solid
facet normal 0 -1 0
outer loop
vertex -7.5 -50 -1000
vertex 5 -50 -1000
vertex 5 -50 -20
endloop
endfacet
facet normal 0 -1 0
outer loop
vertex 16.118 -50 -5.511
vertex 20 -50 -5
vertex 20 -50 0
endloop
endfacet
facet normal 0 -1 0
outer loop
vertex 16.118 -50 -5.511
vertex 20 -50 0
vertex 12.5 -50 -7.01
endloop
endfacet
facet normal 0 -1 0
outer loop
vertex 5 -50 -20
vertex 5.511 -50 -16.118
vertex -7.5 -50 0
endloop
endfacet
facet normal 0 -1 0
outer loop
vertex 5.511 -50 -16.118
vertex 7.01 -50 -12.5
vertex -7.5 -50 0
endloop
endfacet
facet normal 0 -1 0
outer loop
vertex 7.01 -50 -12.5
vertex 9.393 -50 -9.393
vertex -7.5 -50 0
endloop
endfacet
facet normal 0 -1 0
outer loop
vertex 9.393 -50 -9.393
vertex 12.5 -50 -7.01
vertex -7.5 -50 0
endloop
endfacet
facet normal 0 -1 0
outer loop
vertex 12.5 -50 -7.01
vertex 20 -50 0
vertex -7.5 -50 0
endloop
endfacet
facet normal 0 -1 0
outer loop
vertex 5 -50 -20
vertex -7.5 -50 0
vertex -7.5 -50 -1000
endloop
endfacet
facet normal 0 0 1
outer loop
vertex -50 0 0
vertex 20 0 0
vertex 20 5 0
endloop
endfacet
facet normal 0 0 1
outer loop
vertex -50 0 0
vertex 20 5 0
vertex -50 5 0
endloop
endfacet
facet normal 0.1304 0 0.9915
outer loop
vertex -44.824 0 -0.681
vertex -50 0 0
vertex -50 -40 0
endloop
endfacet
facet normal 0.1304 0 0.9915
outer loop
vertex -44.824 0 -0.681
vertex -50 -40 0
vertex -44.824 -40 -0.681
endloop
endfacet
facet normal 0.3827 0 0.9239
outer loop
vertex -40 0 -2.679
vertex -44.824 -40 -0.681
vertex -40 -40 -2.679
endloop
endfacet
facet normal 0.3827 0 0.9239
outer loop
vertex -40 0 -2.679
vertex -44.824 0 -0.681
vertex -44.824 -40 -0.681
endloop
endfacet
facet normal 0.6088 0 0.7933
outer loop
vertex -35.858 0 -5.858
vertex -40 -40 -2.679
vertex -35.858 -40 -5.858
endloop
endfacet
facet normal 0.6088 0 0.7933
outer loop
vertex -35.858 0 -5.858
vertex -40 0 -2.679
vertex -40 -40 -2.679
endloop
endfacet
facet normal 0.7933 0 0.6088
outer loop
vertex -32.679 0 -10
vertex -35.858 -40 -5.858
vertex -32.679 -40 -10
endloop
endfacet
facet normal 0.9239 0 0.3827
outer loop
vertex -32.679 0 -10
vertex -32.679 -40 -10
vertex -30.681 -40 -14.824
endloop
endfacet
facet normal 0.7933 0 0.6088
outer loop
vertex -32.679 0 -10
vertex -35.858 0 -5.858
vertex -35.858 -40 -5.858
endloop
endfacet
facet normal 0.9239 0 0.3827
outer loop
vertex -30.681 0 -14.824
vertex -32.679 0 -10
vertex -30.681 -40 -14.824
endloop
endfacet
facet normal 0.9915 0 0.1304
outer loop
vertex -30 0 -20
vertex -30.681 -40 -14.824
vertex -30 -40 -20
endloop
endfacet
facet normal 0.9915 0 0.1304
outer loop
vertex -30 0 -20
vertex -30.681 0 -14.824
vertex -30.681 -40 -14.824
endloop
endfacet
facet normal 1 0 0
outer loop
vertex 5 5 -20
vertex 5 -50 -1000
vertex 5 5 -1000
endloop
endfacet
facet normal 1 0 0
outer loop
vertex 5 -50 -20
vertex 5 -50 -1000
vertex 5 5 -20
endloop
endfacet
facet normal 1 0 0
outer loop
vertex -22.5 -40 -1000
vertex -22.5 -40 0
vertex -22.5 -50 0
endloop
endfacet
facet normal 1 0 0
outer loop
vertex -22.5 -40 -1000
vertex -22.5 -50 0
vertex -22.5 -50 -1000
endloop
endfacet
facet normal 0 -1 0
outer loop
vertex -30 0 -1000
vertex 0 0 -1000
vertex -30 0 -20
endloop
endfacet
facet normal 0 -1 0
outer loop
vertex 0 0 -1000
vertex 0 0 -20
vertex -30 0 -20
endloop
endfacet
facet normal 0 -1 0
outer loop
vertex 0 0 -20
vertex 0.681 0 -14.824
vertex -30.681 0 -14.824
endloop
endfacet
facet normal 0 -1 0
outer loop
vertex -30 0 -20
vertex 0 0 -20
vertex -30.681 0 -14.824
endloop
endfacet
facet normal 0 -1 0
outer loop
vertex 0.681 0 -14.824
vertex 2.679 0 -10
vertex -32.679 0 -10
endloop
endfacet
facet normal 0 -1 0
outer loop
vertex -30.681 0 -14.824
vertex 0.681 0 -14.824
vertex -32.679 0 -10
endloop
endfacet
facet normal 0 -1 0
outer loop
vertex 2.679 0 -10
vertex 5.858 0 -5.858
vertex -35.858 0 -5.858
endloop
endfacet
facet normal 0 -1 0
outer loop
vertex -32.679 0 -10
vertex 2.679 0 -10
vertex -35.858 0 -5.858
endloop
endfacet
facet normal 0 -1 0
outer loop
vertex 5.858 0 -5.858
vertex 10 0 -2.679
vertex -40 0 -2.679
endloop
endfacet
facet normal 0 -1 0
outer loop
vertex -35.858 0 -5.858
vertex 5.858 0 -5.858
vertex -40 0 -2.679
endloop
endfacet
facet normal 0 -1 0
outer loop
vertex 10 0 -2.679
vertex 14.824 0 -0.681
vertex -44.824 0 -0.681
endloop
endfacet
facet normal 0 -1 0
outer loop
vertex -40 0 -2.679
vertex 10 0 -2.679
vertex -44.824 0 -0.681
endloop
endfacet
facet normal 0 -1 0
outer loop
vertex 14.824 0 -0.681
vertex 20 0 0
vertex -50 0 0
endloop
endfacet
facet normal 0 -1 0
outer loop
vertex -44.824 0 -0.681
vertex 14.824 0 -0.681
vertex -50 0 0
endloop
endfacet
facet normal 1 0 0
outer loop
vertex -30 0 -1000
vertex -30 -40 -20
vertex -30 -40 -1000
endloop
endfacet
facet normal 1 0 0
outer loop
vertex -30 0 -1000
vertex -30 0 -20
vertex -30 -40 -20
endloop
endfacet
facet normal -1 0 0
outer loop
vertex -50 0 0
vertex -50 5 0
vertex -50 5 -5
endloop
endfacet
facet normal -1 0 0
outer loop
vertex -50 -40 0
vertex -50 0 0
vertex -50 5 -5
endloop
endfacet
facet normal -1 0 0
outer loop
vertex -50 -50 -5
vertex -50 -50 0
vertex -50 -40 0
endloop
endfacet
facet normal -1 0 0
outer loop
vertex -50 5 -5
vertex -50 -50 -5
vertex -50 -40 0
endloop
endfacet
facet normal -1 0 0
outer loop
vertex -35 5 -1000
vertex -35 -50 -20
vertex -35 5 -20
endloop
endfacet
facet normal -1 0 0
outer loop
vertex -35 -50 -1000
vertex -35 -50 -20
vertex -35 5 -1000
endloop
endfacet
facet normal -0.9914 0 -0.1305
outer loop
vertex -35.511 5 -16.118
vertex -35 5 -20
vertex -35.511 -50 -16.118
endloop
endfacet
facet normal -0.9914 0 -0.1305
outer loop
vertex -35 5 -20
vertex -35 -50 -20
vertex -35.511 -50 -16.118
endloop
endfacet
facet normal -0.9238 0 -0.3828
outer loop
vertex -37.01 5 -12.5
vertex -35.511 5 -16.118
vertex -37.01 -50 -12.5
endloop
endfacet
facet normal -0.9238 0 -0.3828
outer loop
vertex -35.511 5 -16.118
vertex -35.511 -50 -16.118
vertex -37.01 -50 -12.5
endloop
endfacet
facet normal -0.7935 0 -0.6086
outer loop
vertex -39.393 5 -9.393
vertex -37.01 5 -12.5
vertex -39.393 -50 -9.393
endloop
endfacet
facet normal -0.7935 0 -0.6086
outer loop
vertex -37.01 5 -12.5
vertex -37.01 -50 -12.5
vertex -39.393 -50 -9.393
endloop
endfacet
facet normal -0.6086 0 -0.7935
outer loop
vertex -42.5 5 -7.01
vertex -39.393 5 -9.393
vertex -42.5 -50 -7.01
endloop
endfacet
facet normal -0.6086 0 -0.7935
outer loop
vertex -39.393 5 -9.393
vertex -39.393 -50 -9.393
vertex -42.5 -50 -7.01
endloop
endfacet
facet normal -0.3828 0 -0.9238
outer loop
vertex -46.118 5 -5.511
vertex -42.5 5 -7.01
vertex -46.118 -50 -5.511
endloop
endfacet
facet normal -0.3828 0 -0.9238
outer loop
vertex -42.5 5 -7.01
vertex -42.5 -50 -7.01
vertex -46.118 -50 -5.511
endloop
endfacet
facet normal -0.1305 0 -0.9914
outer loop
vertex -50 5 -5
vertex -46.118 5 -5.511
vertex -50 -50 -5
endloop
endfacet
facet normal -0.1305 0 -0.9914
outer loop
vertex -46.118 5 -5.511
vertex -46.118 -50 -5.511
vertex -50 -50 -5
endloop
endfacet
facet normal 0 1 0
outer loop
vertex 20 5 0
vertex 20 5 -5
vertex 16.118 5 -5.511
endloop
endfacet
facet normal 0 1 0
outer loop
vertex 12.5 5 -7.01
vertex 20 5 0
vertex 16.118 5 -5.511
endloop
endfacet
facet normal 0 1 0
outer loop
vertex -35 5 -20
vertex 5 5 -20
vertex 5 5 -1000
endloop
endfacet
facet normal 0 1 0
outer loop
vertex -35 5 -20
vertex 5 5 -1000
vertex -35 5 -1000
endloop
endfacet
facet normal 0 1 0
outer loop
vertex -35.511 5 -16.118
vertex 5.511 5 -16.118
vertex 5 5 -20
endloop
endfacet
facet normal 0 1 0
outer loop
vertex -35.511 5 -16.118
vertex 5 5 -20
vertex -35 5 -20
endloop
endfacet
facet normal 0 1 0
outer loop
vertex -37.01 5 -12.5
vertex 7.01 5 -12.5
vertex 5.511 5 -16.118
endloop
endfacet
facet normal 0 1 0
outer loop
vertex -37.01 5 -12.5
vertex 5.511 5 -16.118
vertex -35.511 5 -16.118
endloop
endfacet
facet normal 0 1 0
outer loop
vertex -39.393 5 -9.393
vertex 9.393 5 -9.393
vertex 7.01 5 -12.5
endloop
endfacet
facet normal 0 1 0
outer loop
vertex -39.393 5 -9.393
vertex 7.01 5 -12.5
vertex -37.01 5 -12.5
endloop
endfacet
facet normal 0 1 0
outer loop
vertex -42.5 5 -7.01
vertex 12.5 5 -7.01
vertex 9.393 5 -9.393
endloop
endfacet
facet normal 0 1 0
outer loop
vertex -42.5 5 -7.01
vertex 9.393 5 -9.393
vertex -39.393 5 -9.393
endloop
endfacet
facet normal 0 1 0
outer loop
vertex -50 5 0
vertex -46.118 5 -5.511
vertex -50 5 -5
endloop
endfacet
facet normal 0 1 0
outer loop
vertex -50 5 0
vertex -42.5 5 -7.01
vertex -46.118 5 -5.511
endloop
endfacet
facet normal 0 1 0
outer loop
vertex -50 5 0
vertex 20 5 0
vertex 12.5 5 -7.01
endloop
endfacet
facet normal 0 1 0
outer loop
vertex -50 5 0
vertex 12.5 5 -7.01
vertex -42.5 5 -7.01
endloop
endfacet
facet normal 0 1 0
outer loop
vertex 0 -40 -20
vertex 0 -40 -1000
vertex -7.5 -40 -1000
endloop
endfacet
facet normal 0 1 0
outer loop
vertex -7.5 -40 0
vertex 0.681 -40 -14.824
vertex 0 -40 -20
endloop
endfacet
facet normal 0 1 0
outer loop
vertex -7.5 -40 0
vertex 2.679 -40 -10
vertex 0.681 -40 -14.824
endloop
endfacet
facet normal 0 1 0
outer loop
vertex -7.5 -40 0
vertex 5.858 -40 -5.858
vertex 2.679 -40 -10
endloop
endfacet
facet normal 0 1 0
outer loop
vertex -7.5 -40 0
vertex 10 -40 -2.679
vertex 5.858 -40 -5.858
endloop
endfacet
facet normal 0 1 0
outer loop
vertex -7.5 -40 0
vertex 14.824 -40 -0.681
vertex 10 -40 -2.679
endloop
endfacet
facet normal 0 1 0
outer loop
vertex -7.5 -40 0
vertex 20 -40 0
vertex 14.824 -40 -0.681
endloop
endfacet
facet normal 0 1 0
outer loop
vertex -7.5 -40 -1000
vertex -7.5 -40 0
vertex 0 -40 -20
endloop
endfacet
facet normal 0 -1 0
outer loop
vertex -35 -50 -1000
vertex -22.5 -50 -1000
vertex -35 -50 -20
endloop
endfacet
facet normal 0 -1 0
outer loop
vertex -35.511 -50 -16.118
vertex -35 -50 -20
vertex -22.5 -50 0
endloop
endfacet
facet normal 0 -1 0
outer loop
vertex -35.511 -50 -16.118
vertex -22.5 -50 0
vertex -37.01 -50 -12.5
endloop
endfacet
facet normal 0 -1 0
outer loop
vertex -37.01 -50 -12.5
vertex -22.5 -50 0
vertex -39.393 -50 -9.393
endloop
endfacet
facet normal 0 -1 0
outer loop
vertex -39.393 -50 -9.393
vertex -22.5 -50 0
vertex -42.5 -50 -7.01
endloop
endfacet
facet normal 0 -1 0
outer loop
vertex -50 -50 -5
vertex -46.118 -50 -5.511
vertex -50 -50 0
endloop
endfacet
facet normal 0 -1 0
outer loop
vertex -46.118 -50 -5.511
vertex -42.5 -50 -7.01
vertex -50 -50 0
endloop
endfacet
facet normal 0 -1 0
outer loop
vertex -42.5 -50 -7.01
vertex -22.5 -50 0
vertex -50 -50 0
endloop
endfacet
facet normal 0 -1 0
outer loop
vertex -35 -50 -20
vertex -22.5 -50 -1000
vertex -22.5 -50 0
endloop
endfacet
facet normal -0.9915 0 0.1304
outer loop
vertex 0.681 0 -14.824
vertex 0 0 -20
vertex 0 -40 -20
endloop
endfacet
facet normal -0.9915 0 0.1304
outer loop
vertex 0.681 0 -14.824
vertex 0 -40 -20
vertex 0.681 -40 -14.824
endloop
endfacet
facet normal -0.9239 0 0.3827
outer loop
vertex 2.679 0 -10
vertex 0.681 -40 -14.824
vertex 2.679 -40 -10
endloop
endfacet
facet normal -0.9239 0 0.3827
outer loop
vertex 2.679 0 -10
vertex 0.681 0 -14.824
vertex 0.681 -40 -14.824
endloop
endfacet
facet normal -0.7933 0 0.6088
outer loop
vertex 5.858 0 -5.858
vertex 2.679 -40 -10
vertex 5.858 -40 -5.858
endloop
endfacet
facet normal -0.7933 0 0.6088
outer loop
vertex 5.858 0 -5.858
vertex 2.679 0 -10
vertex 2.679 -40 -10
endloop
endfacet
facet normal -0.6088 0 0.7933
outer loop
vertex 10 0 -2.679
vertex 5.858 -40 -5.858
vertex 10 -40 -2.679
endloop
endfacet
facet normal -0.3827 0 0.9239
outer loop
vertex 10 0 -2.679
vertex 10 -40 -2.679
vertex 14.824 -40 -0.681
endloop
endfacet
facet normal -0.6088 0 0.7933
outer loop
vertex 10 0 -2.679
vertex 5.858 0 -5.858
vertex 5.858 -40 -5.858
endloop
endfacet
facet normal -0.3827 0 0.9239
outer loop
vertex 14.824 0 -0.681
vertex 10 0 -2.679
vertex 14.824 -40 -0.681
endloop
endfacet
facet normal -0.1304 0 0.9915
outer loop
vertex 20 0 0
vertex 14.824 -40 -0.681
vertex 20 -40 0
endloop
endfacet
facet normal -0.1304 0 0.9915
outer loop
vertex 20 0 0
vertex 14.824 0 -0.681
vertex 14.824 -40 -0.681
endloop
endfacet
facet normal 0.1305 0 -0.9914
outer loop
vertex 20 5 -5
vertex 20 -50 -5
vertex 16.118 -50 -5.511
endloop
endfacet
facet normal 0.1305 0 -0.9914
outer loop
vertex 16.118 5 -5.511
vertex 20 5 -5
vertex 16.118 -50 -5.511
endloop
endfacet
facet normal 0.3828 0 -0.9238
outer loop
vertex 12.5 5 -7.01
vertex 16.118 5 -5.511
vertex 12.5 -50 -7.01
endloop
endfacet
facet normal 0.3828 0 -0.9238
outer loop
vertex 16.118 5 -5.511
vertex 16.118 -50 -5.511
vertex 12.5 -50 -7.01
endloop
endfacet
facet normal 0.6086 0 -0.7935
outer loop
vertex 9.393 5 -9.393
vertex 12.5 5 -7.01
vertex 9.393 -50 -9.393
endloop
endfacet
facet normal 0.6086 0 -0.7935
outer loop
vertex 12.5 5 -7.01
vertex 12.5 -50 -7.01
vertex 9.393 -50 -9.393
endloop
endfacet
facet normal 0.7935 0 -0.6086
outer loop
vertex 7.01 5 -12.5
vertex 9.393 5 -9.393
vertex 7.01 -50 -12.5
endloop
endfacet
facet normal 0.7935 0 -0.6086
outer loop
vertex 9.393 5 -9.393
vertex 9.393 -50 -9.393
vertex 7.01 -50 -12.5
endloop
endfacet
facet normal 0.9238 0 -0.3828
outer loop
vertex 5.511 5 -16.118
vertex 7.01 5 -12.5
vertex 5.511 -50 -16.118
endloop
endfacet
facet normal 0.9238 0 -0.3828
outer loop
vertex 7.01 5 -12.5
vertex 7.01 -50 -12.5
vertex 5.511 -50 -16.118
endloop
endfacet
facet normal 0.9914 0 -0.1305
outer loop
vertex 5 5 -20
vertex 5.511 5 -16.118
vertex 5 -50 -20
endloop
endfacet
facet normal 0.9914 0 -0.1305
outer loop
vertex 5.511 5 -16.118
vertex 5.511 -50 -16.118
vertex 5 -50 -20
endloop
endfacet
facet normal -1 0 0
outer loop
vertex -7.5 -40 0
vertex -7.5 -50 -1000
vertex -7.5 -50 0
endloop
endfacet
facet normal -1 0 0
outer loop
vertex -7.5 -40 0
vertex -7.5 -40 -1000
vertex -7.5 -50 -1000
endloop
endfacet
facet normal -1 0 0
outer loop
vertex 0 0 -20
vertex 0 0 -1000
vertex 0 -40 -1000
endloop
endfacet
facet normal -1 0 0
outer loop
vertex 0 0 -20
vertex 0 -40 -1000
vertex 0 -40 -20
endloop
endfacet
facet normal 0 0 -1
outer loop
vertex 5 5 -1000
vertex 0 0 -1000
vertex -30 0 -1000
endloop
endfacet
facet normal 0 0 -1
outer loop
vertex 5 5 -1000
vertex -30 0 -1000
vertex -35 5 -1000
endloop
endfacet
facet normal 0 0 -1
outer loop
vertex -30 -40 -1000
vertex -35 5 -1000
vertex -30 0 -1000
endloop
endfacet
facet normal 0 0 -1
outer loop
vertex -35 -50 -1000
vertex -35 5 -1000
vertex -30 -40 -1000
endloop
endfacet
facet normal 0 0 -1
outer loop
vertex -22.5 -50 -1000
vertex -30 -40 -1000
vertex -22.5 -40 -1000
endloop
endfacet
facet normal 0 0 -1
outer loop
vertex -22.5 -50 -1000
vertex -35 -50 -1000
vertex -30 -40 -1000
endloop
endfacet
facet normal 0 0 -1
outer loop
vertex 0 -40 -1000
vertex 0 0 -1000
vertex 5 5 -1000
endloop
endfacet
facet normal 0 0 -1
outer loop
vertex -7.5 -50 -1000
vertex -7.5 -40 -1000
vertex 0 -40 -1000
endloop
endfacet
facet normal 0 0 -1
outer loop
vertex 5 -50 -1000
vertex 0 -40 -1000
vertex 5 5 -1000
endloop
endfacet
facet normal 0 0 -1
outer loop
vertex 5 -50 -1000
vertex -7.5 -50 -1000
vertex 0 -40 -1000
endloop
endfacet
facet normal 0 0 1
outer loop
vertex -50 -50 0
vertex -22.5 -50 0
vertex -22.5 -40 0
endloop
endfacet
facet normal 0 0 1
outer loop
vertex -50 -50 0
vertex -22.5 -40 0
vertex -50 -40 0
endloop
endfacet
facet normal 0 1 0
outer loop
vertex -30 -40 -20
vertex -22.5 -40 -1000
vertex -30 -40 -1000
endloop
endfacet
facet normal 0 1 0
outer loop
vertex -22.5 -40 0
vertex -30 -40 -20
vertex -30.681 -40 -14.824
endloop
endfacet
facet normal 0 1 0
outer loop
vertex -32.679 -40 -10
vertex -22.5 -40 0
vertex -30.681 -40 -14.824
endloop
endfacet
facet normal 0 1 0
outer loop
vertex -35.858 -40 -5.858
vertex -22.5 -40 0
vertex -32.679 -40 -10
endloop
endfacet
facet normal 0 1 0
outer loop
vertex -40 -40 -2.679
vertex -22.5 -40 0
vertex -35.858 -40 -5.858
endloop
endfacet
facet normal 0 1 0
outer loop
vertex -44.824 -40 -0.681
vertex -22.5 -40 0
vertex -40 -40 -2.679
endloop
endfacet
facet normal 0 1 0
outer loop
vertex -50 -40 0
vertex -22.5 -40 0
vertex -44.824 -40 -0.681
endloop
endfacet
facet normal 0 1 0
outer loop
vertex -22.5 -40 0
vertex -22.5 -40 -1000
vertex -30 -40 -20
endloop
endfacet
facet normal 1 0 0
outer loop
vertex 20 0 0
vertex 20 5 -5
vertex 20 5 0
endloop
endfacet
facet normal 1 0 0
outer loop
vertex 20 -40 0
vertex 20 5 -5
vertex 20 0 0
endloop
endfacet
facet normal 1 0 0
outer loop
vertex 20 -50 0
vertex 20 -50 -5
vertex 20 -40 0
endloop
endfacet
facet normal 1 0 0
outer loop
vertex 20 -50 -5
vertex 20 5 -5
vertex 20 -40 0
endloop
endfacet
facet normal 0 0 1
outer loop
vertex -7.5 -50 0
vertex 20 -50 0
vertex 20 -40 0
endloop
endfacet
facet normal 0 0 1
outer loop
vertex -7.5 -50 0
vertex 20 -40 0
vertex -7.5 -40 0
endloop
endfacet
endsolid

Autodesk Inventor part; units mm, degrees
ref_plane "YZ Plane" through (0, 0, 0) normal (1, 0, 0) x (0, 1, 0)
ref_plane "XZ Plane" through (0, 0, 0) normal (0, 1, 0) x (-1, 0, 0)
ref_plane "XY Plane" through (0, 0, 0) normal (0, 0, 1) x (1, 0, 0)
sketch "Skizze1" plane through (0, 0, 0) normal (0, 1, 0) x (-1, 0, 0)
  line L0 (0, 0) -> (30, 0)
  line L1 (30, 0) -> (30, -1000)
  line L2 (30, -1000) -> (0, -1000)
  line L3 (0, -1000) -> (0, 0)
  line L4 (0, 0) -> (-20, 0)
  line L5 (-5, -20) -> (0, -20)
  arc A0 (0, -20) -> (-20, 0) centre (-20, -20) ccw
  line L6 (30, 0) -> (30, -20)
  line L7 (30, -20) -> (35, -20)
  arc A1 (50, 0) -> (30, -20) centre (50, -20) ccw
  line L8 (50, 0) -> (50, -5)
  arc A2 (50, -5) -> (35, -20) centre (50, -20) ccw
  line L9 (0, -20) -> (-5, -20)
  arc A3 (-5, -20) -> (-20, -5) centre (-20, -20) ccw
  line L10 (35, -20) -> (35, -1000)
  line L11 (35, -1000) -> (30, -1000)
  line L12 (0, -1000) -> (-5, -1000)
  line L13 (-5, -1000) -> (-5, -20)
  line L14 (30, 0) -> (50, 0)
  line L15 (-20, -5) -> (-20, 0)
  line L16 (-20, 0) -> (0, 0)
  line L17 (0, 0) -> (0, -20)
  line L18 (0, -20) -> (-5, -20)
  line L19 (-20, -5) -> (-20, 0)
  arc A4 (0, -20) -> (-20, 0) centre (-20, -20) ccw
  line L20 (0, -20) -> (0, 0)
  line L21 (0, 0) -> (-20, 0)
  dimension "d0" = 30
  dimension "d1" = 1000
  dimension "d2" = 20
  dimension "d5" = 20
  dimension "d10" = 5
  dimension "d11" = 5
  dimension "d12" = 5
extrude "Extrusion1" add sketch "Skizze1" along normal blind 5
extrude "Extrusion2" add sketch "Skizze1" against normal blind 50 contours L3 L12 L13 L5 | L5 A3 L15 A0 | L7 L10 L11 L1 | A1 L8 A2 L7
extrude "Extrusion3" add sketch "Skizze1" against normal blind 50 contours L0 L1 L2 L3 | L3 A0 L4 | L14 A1 L1
extrude "Extrusion4" cut sketch "Skizze1" against normal blind 40 contours L0 L1 L2 L3 | L3 A0 L4 | L14 A1 L1
sketch "Skizze2" plane through (0, 0, 0) normal (0, -1, 0) x (1, 0, 0)
  arc A0 (-35, -20) -> (-50, -5) centre (-50, -20) ccw projected
  line L0 (5, -20) -> (5, -1000) projected
  line L1 (-50, -5) -> (5, -20)
  line L2 (5, -36.012) -> (-15, -36.012)
  line L3 (-35, -20) -> (-35, -1000) projected
  line L4 (-15, -36.012) -> (-22.5, -36.012)
  line L5 (-22.5, -36.012) -> (-7.5, -36.012)
  line L6 (-7.5, -36.012) -> (-7.5, 0)
  line L7 (-50, 0) -> (20, 0) projected
  line L8 (-7.5, 0) -> (-22.5, 0)
  line L9 (-22.5, 0) -> (-22.5, -1000)
  line L10 (-30, -1000) -> (0, -1000) projected
  line L11 (-22.5, -1000) -> (-7.5, -1000)
  line L12 (-7.5, -1000) -> (-7.5, 0)
  point P0 (0, 0)
  dimension "d21" = 20
  dimension "d22" = 15
  dimension "d23" = 15
  dimension "d24" = 15
extrude "Extrusion5" cut sketch "Skizze2" along normal blind 50 contours L9 L7 L6 L1 | L1 L6 L2 L4 L9 | L4 L2 L12 L10 L9
properties part number "Fuehrungsschiene"
